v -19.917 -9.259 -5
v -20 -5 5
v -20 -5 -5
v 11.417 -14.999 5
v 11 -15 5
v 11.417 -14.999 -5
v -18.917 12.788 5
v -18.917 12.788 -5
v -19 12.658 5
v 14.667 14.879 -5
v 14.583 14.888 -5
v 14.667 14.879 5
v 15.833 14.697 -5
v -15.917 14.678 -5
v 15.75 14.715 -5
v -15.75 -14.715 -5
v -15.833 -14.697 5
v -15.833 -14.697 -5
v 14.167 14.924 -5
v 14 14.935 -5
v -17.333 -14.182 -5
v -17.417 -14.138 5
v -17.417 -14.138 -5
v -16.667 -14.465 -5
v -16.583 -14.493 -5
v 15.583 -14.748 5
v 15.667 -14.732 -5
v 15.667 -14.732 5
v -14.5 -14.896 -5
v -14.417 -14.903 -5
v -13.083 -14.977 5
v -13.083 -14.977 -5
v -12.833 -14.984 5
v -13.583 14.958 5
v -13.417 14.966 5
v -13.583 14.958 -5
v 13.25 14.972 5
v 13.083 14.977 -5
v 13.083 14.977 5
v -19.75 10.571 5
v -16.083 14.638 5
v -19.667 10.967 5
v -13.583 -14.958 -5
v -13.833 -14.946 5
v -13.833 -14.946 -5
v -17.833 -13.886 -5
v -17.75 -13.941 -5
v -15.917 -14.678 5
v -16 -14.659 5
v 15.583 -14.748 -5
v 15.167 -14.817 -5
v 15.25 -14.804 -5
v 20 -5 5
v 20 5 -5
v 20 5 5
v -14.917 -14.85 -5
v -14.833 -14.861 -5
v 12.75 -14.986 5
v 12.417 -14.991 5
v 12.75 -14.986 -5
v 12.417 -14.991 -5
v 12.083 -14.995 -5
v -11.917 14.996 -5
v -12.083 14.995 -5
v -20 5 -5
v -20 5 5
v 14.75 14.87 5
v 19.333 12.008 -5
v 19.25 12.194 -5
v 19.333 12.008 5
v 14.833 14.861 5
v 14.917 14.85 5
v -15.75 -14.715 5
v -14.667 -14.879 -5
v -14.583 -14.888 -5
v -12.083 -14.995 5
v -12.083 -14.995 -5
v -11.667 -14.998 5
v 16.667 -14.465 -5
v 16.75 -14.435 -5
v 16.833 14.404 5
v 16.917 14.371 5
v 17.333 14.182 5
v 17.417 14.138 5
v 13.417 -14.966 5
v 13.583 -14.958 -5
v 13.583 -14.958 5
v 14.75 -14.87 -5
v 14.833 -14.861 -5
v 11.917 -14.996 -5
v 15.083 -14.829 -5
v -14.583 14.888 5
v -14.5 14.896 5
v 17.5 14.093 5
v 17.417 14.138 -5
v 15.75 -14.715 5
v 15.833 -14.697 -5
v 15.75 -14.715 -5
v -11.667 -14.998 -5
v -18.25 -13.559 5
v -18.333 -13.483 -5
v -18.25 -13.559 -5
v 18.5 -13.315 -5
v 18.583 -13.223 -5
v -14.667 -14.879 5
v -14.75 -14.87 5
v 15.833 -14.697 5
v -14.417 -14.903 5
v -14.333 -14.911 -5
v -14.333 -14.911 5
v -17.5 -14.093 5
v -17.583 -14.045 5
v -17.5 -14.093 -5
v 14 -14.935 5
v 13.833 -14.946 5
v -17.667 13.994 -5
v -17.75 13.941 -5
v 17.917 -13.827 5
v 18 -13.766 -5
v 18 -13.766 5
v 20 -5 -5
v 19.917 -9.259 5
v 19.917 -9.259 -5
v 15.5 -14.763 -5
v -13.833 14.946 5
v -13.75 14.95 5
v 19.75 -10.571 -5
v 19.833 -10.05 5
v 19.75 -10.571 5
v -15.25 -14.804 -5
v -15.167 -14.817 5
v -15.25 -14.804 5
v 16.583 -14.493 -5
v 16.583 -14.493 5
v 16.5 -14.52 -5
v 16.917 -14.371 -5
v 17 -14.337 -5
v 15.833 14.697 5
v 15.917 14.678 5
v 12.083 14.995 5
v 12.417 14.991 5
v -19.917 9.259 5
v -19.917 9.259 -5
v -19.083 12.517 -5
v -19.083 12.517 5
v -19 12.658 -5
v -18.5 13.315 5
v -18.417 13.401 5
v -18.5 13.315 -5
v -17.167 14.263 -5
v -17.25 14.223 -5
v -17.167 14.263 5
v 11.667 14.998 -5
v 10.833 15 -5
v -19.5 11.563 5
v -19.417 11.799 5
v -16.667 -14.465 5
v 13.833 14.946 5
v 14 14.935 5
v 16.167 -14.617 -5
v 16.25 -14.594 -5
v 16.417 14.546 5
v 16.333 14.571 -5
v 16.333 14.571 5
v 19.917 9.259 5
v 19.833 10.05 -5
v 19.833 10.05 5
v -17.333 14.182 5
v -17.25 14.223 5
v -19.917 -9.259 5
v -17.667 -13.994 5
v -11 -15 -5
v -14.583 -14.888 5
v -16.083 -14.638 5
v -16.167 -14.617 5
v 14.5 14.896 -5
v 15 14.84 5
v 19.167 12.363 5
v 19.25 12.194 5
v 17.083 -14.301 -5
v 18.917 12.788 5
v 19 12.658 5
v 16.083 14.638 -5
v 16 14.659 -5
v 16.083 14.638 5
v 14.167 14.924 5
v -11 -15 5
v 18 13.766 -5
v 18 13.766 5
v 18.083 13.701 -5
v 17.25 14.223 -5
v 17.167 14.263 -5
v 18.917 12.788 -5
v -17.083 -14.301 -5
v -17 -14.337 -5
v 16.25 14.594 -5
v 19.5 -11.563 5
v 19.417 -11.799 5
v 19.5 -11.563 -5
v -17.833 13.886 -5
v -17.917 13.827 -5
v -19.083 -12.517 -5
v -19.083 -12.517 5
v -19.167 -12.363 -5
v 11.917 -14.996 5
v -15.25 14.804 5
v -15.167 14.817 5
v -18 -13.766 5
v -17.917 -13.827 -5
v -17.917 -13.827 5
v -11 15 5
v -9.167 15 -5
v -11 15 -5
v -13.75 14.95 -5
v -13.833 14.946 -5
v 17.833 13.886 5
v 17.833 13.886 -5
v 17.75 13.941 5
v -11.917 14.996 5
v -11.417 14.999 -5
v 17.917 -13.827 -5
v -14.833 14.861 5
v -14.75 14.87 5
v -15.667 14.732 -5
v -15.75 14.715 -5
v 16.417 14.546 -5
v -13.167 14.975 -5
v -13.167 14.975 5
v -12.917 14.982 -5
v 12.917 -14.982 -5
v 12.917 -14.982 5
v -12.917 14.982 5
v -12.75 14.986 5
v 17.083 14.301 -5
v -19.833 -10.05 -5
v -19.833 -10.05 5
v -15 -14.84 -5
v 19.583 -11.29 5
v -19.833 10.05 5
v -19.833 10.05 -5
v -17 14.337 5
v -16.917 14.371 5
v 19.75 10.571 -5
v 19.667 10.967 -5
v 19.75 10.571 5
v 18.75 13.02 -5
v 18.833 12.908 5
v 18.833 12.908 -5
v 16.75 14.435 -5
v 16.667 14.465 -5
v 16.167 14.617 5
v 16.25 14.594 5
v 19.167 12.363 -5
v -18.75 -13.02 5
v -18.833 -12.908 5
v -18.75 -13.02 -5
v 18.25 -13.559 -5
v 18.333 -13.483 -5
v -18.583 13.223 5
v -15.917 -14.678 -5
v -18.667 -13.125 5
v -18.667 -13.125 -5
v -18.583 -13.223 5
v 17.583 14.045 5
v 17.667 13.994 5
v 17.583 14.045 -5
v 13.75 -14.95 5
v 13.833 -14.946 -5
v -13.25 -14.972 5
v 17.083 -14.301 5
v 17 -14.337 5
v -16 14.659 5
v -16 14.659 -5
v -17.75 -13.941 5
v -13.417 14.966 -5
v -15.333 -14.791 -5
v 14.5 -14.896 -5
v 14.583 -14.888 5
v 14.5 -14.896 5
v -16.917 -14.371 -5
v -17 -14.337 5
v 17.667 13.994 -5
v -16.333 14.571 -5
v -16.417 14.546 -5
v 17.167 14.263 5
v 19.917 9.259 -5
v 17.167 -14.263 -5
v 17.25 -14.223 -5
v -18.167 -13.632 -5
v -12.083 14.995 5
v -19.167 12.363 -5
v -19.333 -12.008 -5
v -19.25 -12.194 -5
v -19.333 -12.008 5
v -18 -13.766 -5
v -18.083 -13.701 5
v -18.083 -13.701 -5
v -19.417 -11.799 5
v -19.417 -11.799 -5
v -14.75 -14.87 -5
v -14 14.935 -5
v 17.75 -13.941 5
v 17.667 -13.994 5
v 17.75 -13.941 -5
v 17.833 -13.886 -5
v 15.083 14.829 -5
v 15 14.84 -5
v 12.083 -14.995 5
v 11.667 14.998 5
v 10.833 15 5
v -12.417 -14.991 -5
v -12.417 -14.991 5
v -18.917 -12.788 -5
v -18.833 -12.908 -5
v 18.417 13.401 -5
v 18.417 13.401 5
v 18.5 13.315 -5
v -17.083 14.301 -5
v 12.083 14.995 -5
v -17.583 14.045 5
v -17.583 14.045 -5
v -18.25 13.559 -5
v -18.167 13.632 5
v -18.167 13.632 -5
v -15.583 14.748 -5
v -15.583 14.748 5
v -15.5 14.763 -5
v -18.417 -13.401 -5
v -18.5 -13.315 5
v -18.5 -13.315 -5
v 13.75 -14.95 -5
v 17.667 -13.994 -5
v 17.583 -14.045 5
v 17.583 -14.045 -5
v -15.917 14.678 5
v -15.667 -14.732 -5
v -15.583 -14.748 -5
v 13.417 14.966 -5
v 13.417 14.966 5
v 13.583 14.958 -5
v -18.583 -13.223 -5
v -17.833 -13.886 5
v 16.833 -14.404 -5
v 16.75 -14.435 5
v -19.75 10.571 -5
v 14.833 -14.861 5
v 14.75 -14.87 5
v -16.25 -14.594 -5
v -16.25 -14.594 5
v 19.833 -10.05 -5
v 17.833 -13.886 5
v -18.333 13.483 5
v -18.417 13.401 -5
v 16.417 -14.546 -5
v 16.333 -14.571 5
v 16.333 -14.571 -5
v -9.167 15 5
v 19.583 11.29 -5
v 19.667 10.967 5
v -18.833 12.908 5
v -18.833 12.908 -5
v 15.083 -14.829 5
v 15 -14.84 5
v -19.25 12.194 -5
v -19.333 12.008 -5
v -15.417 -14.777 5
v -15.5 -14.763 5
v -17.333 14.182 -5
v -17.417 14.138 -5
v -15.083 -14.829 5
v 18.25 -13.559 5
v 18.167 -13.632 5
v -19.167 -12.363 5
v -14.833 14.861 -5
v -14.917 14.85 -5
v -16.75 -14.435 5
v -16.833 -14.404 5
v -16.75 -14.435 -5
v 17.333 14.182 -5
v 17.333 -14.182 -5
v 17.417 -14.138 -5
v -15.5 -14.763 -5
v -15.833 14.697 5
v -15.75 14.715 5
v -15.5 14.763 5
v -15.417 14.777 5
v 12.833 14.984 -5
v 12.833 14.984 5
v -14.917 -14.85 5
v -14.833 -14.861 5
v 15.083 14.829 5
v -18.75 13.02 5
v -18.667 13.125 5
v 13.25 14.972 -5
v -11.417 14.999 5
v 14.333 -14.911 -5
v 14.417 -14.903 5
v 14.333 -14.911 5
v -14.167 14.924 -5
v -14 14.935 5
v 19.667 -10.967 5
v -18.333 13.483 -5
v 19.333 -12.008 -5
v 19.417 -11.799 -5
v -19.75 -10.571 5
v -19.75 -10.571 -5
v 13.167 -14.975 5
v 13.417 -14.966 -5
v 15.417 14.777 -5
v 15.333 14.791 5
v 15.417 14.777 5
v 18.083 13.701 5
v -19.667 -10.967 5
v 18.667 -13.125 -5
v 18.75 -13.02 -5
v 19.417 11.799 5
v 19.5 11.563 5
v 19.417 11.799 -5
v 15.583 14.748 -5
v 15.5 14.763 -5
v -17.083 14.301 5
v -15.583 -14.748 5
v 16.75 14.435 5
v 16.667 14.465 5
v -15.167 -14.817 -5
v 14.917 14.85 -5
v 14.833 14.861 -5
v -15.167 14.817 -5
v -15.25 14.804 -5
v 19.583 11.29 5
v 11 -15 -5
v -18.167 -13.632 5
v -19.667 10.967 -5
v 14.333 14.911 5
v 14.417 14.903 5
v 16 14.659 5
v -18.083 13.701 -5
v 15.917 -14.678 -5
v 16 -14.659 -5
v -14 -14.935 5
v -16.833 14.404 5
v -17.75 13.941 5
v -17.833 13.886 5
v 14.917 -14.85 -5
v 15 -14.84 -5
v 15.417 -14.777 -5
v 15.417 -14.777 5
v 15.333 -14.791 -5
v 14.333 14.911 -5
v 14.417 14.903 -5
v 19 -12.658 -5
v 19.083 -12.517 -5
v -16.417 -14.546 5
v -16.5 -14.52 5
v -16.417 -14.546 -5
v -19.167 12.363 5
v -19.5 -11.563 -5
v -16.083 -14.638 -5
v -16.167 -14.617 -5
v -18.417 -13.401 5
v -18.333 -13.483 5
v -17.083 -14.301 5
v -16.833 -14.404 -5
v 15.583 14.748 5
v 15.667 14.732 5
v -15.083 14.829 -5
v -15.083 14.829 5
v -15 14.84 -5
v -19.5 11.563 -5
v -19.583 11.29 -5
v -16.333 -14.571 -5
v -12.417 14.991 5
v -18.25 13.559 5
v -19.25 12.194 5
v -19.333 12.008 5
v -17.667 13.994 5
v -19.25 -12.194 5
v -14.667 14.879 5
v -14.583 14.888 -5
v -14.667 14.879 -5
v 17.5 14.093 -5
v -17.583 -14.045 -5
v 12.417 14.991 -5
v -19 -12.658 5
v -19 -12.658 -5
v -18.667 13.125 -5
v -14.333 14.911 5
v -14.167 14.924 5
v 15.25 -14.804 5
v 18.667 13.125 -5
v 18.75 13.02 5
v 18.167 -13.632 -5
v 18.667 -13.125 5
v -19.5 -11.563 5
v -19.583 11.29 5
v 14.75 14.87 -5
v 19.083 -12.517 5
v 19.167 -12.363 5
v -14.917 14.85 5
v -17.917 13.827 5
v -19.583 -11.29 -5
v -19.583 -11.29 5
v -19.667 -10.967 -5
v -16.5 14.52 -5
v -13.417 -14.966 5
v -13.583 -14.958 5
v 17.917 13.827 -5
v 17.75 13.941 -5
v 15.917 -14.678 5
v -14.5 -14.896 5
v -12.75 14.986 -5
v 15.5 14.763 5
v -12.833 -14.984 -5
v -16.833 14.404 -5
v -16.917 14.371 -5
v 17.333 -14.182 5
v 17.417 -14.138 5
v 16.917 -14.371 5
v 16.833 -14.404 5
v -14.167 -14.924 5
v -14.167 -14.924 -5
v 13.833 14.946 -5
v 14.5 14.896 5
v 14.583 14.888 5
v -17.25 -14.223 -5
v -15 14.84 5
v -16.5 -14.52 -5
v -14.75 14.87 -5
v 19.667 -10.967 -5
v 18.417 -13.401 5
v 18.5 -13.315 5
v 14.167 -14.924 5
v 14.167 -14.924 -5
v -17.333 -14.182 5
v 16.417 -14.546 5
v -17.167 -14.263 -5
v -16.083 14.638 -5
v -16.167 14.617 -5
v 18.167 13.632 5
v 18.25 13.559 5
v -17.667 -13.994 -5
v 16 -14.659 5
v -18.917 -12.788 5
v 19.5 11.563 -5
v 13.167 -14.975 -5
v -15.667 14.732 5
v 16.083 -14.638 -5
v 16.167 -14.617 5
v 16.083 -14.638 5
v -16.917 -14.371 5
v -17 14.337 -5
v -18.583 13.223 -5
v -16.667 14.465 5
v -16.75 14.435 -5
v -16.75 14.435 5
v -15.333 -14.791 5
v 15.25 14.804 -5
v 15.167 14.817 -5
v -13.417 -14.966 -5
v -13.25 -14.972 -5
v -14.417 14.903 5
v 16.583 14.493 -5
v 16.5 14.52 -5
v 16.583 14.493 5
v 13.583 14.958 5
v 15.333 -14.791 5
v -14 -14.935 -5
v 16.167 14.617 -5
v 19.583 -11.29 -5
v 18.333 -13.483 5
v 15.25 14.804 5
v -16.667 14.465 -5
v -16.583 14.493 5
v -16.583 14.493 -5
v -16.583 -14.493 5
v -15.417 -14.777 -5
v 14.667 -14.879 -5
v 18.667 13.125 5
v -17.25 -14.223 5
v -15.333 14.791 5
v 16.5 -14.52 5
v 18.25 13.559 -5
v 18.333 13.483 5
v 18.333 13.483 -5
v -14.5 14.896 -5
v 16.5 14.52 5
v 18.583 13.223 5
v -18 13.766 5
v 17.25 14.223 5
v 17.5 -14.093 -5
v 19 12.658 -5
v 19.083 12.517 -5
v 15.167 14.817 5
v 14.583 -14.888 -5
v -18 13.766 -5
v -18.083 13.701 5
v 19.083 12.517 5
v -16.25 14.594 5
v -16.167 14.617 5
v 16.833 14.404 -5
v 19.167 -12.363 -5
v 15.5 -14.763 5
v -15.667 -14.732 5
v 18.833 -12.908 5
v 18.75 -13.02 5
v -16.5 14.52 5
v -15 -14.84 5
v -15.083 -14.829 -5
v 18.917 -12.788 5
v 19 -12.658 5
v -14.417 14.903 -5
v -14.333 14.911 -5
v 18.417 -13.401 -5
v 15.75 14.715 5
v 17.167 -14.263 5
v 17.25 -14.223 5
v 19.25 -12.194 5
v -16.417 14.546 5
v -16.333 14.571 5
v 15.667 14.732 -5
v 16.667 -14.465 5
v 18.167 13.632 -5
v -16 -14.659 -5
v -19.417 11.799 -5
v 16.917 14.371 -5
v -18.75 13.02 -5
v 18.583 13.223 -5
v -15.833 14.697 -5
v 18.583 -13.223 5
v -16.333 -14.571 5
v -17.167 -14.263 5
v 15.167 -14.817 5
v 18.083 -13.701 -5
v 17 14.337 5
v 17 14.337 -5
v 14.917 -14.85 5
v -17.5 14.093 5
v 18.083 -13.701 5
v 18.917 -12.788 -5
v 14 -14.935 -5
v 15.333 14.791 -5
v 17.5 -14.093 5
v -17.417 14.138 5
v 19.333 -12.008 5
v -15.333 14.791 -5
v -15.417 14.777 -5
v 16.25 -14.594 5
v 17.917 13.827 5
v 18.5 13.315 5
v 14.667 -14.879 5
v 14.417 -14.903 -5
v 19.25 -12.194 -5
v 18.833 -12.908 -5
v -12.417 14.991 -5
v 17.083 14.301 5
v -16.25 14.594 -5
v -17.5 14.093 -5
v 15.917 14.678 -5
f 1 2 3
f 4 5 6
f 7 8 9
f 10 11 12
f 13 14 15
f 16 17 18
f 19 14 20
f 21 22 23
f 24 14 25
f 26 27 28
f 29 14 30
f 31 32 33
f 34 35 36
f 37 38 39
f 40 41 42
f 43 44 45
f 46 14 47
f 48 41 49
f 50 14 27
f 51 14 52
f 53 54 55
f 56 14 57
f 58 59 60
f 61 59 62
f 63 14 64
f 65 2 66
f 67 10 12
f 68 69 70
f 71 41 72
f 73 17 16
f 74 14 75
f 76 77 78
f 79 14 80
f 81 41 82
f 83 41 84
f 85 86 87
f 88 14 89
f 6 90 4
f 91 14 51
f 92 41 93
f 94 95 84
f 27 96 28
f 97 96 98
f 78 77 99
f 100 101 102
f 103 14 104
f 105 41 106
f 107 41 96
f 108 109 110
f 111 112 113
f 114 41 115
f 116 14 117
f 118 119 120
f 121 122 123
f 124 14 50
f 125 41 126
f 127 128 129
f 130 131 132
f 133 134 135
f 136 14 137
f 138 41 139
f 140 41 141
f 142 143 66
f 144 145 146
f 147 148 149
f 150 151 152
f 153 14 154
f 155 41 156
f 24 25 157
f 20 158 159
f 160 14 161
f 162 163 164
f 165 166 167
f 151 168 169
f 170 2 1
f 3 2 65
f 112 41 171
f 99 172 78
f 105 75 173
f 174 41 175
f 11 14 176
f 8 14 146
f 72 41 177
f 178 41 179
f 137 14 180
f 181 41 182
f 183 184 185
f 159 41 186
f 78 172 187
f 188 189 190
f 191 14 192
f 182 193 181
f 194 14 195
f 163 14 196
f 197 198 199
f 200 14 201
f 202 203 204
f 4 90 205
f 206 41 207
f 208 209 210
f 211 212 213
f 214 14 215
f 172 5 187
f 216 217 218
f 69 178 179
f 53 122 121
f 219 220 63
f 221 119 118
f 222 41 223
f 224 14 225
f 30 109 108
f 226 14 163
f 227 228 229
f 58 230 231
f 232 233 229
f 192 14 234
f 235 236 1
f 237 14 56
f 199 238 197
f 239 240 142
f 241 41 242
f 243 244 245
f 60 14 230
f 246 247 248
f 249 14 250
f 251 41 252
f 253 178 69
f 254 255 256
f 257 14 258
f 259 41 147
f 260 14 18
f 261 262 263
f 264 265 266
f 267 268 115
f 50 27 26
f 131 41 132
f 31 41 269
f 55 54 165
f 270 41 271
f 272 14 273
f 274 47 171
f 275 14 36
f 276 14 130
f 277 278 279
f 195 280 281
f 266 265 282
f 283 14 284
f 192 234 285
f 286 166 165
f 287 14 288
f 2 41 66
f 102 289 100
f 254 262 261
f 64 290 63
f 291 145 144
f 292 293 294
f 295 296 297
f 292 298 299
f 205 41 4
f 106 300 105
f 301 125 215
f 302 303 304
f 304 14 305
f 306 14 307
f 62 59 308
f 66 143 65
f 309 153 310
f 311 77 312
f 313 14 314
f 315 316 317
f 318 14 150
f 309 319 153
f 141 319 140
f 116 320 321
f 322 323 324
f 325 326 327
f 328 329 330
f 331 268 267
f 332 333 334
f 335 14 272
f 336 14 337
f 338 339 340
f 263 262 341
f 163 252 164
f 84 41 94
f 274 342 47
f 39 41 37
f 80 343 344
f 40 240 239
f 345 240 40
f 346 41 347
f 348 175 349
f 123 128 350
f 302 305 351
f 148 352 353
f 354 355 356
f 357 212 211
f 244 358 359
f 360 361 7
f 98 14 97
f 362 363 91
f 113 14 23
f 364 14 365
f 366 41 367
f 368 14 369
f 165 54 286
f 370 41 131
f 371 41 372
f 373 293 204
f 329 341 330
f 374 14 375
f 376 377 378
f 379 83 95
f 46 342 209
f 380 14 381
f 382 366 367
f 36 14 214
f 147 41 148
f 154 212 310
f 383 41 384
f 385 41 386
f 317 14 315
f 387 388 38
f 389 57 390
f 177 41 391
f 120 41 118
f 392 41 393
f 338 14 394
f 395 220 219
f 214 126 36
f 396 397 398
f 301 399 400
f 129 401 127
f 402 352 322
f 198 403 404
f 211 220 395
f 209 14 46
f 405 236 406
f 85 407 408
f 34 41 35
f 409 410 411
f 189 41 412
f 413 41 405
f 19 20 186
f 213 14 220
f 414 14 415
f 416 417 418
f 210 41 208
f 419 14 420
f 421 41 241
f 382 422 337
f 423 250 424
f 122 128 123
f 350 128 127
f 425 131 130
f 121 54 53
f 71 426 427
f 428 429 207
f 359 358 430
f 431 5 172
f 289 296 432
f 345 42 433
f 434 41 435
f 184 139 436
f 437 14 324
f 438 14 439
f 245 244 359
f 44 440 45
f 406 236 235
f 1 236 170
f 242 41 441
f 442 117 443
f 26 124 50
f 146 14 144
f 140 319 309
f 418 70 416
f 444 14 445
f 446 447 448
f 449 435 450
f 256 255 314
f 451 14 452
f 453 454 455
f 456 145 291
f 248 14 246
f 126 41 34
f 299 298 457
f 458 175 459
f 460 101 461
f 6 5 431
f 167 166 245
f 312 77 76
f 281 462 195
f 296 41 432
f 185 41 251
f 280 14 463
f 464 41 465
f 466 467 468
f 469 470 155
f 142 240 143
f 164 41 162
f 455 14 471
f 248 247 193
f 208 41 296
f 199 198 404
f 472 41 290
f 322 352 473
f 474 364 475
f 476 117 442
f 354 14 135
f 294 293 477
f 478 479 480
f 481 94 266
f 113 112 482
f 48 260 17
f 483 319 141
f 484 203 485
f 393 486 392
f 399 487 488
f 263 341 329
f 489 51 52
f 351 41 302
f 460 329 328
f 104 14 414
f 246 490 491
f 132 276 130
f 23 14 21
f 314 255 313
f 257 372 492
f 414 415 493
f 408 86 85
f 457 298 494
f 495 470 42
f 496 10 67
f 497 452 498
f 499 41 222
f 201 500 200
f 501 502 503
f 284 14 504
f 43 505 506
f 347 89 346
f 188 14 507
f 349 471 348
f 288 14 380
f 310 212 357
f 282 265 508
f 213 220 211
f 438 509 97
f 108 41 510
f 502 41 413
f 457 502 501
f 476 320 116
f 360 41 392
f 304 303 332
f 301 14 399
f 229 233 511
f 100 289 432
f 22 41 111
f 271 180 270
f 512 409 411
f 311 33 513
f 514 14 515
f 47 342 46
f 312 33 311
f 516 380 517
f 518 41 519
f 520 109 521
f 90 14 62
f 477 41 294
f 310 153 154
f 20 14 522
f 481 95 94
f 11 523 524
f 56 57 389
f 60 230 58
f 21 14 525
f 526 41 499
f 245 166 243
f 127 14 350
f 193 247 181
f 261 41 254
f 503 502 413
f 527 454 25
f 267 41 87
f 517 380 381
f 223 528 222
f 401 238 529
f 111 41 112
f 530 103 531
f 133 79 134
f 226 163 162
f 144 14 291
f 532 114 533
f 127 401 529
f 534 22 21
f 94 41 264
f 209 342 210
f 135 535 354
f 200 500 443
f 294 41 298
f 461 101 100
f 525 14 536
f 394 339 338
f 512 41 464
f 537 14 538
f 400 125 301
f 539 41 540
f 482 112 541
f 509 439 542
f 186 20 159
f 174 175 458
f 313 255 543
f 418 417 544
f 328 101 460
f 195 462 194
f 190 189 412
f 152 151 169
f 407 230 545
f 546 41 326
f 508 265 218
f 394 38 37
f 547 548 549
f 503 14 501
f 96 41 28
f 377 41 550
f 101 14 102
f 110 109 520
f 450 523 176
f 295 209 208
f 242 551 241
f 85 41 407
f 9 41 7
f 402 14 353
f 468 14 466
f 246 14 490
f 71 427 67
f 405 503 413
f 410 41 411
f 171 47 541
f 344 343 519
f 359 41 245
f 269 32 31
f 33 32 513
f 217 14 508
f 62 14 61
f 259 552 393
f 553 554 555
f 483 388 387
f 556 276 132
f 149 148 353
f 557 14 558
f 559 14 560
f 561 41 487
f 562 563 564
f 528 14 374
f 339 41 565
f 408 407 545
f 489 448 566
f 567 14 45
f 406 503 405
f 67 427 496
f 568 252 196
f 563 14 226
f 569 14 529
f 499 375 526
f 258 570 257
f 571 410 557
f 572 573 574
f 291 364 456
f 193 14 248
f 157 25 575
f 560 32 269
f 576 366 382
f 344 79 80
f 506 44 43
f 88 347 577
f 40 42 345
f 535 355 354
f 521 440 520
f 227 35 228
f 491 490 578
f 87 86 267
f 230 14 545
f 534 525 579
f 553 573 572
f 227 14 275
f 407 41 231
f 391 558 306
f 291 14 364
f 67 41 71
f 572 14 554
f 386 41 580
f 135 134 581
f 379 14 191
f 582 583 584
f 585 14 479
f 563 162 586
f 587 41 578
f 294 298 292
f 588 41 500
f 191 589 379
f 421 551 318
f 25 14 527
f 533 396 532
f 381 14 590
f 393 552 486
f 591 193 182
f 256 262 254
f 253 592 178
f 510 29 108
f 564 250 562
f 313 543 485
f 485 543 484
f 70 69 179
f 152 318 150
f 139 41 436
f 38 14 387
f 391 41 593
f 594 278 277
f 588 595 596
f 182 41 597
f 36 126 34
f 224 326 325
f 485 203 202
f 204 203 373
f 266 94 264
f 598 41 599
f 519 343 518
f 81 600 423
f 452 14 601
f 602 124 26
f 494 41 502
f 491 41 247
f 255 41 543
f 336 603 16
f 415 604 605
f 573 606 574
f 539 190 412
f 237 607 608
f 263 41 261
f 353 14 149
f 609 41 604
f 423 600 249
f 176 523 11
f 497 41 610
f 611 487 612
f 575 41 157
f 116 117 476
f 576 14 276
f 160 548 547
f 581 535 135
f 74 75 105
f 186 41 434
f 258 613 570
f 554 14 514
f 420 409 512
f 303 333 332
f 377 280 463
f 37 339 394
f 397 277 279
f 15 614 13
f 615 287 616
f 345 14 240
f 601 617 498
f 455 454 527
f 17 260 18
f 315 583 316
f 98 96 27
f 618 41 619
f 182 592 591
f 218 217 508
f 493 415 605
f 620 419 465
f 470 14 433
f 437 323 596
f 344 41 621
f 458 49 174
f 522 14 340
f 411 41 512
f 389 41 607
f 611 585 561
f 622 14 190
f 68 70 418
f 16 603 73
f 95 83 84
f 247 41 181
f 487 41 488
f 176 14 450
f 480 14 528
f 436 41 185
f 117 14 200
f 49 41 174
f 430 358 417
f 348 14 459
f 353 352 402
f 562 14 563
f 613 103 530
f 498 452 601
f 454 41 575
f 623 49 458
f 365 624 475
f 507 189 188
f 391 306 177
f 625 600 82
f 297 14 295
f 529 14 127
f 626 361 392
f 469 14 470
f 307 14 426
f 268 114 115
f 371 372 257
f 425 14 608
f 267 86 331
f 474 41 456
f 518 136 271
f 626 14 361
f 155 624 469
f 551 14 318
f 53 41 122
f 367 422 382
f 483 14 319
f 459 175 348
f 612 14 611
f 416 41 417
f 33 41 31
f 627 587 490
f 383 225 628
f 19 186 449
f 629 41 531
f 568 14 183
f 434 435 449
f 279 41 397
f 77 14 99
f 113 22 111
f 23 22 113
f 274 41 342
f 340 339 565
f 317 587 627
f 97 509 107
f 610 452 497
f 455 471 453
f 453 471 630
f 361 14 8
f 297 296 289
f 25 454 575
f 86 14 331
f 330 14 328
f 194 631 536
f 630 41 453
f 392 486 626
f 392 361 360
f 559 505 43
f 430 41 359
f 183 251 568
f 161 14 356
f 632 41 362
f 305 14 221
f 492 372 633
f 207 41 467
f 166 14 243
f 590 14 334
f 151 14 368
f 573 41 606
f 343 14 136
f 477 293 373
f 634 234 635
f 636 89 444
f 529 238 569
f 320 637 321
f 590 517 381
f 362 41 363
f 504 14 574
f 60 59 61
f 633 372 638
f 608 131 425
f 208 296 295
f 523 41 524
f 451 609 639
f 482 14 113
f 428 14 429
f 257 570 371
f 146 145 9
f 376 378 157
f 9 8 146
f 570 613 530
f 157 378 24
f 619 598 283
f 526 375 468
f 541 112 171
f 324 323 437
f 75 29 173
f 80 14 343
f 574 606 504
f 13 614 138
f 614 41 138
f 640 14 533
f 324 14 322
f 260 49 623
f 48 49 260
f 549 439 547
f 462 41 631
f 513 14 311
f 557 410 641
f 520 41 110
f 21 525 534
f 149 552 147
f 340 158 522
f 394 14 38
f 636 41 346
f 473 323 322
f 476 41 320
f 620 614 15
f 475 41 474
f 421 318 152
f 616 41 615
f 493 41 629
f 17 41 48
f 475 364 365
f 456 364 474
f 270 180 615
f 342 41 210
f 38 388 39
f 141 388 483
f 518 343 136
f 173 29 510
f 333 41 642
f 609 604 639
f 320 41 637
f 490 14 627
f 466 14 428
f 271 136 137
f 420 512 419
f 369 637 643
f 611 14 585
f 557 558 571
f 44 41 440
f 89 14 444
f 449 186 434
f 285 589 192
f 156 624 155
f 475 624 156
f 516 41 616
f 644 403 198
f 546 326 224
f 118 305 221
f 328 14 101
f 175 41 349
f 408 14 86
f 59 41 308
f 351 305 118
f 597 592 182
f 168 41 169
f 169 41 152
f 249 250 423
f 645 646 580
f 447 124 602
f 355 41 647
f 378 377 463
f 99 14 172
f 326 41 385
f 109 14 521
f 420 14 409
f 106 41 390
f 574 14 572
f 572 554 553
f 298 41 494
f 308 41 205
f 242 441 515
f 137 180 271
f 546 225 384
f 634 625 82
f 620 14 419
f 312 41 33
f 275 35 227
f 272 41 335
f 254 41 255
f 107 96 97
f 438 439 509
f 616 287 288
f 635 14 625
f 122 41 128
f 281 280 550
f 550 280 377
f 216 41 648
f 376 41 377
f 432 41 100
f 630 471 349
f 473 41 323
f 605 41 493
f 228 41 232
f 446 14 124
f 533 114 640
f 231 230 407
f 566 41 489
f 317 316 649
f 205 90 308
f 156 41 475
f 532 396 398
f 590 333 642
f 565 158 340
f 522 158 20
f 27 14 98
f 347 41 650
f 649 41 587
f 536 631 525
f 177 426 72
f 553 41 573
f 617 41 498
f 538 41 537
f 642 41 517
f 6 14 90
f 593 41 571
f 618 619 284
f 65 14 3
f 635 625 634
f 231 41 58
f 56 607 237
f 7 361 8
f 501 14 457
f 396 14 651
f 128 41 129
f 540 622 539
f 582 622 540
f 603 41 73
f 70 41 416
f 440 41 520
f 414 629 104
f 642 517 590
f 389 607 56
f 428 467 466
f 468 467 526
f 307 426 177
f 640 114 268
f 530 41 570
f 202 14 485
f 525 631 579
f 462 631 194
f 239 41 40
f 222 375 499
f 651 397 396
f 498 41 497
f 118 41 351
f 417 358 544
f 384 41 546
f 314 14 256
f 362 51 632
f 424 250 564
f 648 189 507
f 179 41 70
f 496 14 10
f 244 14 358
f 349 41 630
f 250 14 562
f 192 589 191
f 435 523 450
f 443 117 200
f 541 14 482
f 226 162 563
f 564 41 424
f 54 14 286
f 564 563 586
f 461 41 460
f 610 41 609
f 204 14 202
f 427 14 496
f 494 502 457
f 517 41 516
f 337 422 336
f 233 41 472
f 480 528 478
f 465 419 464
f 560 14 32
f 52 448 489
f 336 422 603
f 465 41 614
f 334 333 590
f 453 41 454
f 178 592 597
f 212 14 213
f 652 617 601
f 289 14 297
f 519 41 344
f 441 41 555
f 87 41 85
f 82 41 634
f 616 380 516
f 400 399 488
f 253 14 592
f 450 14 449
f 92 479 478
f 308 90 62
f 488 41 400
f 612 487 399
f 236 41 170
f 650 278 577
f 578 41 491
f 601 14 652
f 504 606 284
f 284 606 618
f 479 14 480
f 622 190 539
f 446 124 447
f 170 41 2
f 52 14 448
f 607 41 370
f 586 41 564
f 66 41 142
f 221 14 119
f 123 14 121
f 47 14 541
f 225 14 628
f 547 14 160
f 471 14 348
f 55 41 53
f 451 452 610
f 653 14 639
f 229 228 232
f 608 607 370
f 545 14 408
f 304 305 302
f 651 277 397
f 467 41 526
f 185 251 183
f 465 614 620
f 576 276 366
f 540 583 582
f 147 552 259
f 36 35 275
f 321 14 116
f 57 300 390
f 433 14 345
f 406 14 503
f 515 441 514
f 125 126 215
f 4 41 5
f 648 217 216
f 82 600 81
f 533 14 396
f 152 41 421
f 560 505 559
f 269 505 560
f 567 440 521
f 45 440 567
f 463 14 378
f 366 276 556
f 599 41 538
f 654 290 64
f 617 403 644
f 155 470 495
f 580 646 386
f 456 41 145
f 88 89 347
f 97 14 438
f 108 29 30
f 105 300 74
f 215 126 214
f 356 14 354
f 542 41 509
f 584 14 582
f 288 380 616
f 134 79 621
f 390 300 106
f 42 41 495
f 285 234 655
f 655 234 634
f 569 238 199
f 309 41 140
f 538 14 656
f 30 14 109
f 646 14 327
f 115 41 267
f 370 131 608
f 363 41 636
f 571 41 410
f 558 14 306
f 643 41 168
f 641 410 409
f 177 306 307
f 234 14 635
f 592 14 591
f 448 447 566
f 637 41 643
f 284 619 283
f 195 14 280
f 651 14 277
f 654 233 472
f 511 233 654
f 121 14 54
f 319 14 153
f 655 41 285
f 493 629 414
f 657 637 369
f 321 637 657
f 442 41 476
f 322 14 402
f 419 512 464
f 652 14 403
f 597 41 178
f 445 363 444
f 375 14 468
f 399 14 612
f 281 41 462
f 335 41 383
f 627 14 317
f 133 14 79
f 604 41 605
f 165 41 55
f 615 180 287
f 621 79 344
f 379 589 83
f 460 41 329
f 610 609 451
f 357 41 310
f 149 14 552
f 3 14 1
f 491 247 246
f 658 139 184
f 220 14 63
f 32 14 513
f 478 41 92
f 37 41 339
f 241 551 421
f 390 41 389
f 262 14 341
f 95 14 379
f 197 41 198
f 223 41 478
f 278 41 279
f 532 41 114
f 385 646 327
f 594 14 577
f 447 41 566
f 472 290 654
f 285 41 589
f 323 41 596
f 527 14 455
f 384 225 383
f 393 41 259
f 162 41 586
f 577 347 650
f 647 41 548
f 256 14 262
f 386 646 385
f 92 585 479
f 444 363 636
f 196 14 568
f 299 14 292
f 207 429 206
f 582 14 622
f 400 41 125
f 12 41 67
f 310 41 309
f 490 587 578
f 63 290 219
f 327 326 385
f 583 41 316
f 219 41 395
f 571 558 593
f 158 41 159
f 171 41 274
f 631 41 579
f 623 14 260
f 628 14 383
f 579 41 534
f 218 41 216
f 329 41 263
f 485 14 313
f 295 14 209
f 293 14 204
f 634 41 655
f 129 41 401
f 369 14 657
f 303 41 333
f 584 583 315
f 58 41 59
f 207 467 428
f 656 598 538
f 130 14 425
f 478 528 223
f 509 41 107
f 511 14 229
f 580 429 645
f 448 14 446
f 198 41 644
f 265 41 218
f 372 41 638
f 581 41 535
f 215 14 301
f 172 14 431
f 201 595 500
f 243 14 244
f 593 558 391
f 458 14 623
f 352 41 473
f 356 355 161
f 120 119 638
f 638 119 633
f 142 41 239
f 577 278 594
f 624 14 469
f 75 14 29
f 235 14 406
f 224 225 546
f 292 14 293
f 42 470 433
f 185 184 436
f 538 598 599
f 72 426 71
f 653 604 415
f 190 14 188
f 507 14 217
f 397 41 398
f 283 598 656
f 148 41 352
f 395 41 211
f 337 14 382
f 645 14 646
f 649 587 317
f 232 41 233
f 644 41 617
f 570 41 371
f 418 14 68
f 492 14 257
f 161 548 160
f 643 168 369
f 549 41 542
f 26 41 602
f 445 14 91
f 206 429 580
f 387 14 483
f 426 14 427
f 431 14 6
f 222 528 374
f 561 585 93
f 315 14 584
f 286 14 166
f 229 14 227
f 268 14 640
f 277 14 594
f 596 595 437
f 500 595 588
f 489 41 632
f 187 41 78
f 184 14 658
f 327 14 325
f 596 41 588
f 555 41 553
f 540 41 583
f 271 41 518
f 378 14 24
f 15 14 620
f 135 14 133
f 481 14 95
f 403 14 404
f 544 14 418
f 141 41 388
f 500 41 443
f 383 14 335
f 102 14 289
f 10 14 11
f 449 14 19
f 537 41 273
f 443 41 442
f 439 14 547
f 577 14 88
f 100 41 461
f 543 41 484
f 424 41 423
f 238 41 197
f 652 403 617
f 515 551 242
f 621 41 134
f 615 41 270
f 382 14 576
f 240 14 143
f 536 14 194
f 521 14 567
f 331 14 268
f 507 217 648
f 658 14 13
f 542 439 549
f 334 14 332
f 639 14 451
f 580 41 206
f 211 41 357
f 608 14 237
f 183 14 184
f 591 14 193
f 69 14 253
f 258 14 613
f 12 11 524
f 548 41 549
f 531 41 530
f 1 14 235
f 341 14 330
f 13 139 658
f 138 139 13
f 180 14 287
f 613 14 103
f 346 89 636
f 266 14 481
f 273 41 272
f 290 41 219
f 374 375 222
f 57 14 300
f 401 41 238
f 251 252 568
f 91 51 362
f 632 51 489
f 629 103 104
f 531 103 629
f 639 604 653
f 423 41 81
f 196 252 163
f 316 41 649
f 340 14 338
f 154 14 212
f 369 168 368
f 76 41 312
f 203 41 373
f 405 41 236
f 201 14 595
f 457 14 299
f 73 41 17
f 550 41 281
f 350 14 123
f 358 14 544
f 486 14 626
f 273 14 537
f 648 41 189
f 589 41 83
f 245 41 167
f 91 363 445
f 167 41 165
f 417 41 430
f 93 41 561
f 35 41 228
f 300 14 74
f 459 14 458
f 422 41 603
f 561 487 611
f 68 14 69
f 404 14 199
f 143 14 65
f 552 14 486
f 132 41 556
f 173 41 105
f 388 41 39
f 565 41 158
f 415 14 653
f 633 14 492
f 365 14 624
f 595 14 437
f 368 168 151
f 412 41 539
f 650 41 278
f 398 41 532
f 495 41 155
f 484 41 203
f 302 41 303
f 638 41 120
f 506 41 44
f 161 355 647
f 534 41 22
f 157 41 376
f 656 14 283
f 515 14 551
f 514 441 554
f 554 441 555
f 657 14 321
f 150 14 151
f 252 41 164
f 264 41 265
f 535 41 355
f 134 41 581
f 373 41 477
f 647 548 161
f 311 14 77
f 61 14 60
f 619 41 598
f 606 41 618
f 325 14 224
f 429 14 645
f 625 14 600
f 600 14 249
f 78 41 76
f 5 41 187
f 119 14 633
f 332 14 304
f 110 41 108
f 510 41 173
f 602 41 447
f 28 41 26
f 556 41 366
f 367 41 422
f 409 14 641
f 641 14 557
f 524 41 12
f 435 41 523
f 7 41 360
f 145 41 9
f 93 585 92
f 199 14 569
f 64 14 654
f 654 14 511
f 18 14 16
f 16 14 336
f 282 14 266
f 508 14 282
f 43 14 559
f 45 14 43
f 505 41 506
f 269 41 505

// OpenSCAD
/* An OpenSCAD squircle

Copyright (C) 2022 by Brendan M. Sleight
Permission to use, copy, modify, and/or distribute this software for any purpose with or without fee is hereby granted. 

https://en.wikipedia.org/wiki/Squircle

A squircle is a shape intermediate between a square and a circle.
A superellipse, where x^4 + y^4 = 1.

example:-
squircle([40,30,10], r=10, center=false);
   r and center is optional 
 
*/
function half_squircle_y_positive(steps) = [for (x = [-1 : 1/steps : 1]) [x, pow(abs(1-pow(x,4)),1/4)] ];
function half_squircle_y_negative(steps) = [for (x = [-1 : 1/steps : 1]) [x, -pow(abs(1-pow(x,4)),1/4)] ];
// Need to make sure 2r>X or Y 
function adjusted_r(r=0, size) = (r==0) ? min(size[0],size[1])/2 : min(size[0],size[1],2*r)/2 ;

module squircle_base(r = 1, sides = 60*4)
{
    resize([r*2, 0, 0], auto=true)
        // Risize squircle with Radius=1, hence z=2 
        linear_extrude(2 , center = true) 
            hull()
            {
                polygon(half_squircle_y_positive(sides/2));
                polygon(half_squircle_y_negative(sides/2));
            }
}

module squircle_corners(x=5, y=5, z=5, r=1, sides = 60*4)
{
    resize([0,0,z]) hull()
    {
        translate([+x/2-r,+y/2-r,0])squircle_base(r=r, sides=sides);
        translate([+x/2-r,-y/2+r,0])squircle_base(r=r, sides=sides);
        translate([-x/2+r,+y/2-r,0])squircle_base(r=r, sides=sides);
        translate([-x/2+r,-y/2+r,0])squircle_base(r=r, sides=sides);
    }
}

module squircle(size, r=0, sides = 60*4, center=true)
{
    
    if(center)
    {
        translate([0,0,0]) squircle_corners(x=size[0], y=size[1], z=size[2], r=adjusted_r(r,size), sides=sides);
    }
    else
    {
        translate([size[0]/2,size[1]/2,size[2]/2]) squircle_corners(x=size[0], y=size[1], z=size[2], r=adjusted_r(r,size), sides=sides);
    }
}

squircle([40,30,10], r=10, center=true);
